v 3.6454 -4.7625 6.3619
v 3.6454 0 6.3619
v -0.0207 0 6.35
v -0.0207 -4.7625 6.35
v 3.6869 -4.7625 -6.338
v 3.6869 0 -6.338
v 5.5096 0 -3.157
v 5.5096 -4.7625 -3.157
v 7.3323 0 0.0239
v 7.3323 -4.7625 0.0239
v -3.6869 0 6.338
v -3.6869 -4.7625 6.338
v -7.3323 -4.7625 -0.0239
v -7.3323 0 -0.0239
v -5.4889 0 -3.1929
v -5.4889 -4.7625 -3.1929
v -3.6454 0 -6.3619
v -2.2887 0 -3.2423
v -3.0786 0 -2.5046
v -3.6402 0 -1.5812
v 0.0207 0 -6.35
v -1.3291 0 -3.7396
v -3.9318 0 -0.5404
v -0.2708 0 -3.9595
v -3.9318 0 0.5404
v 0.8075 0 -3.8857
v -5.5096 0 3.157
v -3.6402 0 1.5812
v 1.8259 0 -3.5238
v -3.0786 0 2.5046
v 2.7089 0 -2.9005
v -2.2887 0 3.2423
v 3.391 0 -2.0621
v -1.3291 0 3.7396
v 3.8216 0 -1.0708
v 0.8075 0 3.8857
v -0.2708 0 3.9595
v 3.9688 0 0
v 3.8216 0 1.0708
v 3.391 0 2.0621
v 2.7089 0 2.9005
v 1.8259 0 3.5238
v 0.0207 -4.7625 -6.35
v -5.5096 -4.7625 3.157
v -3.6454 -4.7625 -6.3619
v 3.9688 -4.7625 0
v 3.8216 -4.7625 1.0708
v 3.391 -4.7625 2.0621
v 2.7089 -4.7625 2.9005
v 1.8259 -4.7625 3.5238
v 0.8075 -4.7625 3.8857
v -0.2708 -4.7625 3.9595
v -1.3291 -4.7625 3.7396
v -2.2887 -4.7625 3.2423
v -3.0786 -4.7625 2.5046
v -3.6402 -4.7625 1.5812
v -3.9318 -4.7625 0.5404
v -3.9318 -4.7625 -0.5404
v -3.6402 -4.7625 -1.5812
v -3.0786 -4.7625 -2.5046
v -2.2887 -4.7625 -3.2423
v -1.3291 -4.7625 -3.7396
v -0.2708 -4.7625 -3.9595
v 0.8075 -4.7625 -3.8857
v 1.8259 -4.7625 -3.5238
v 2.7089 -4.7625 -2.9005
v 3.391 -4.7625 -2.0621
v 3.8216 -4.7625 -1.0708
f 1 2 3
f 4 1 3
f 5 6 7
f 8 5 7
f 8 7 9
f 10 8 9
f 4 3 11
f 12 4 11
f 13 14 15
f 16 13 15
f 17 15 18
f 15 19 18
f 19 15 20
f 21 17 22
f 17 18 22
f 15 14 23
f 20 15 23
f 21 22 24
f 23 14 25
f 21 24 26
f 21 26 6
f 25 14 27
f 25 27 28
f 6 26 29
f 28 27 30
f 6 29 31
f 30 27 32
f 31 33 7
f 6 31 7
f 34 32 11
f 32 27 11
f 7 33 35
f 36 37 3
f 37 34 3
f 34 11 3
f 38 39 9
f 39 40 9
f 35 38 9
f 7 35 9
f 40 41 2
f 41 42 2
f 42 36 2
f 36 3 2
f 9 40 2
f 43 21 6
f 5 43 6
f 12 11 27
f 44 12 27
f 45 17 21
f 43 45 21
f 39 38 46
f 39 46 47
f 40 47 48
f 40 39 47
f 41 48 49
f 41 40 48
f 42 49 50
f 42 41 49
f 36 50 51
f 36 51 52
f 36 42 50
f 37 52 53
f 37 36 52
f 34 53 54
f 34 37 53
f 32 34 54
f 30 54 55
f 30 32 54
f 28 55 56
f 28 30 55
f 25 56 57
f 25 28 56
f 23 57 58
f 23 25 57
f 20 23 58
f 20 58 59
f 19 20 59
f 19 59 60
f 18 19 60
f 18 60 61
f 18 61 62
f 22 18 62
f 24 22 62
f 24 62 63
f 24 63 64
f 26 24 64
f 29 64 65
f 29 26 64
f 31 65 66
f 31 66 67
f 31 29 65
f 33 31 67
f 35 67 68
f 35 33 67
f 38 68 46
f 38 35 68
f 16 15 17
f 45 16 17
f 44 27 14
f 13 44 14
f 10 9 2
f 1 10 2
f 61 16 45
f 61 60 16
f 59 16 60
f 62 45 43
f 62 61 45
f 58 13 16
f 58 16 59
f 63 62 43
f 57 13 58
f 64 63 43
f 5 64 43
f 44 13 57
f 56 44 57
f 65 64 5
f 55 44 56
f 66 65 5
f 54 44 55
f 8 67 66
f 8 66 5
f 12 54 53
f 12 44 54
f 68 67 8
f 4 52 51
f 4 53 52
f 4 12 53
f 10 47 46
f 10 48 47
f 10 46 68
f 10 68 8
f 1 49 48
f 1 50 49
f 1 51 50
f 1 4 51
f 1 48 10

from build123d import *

# Parameters (mm, degrees)
F0_R     = 3.96875
F1_DEPTH = 4.7625


with BuildPart() as f1:
    # F0 (on Front) → F1 (new body)
    with BuildSketch(Plane.XZ):
        with BuildLine():
            ThreePointArc((5.5096007047, -3.1570239268), (6.1363044447, -1.6334833218), (6.35, 0))
            ThreePointArc((6.35, 0), (6.1309371935, 1.6535141757), (5.4888632664, 3.1929422235))
            ThreePointArc((5.4888632664, 3.1929422235), (3.1570238869, 5.5096007276), (-0.0207375096, 6.3499661382))
            ThreePointArc((-0.0207375096, 6.3499661382), (-3.1929422935, 5.4888632257), (-5.5096007601, 3.1570238302))
            ThreePointArc((-5.5096007601, 3.1570238302), (-6.3499661379, -0.0207375771), (-5.4888631828, -3.1929423673))
            ThreePointArc((-5.4888631828, -3.1929423673), (-3.1570238246, -5.5096007633), (0.020737487, -6.3499661382))
            ThreePointArc((0.020737487, -6.3499661382), (3.1929422356, -5.4888632594), (5.5096007047, -3.1570239268))
        make_face()
        Circle(F0_R, mode=Mode.SUBTRACT)
        with BuildLine():
            ThreePointArc((-5.5096007601, 3.1570238302), (-3.1929422935, 5.4888632257), (-0.0207375096, 6.3499661382))
            Line((-0.0207375096, 6.3499661382), (-3.6868921494, 6.3379933427))
            Line((-3.6868921494, 6.3379933427), (-5.5096007601, 3.1570238302))
        make_face()
        with BuildLine():
            ThreePointArc((-5.4888631828, -3.1929423673), (-6.3499661379, -0.0207375771), (-5.5096007601, 3.1570238302))
            Line((-5.5096007601, 3.1570238302), (-7.3323093185, -0.023945591))
            Line((-7.3323093185, -0.023945591), (-5.4888631828, -3.1929423673))
        make_face()
        with BuildLine():
            Line((-3.6454171691, -6.3619389337), (0.020737487, -6.3499661382))
            ThreePointArc((0.020737487, -6.3499661382), (-3.1570238246, -5.5096007633), (-5.4888631828, -3.1929423673))
            Line((-5.4888631828, -3.1929423673), (-3.6454171691, -6.3619389337))
        make_face()
        with BuildLine():
            Line((3.6868921494, -6.3379933427), (5.5096007047, -3.1570239268))
            ThreePointArc((5.5096007047, -3.1570239268), (3.1929422356, -5.4888632594), (0.020737487, -6.3499661382))
            Line((0.020737487, -6.3499661382), (3.6868921494, -6.3379933427))
        make_face()
        with BuildLine():
            ThreePointArc((5.4888632664, 3.1929422235), (6.1309371935, 1.6535141757), (6.35, 0))
            ThreePointArc((6.35, 0), (6.1363044447, -1.6334833218), (5.5096007047, -3.1570239268))
            Line((5.5096007047, -3.1570239268), (7.3323093185, 0.023945591))
            Line((7.3323093185, 0.023945591), (5.4888632664, 3.1929422235))
        make_face()
        with BuildLine():
            ThreePointArc((-0.0207375096, 6.3499661382), (3.1570238869, 5.5096007276), (5.4888632664, 3.1929422235))
            Line((5.4888632664, 3.1929422235), (3.6454171691, 6.3619389337))
            Line((3.6454171691, 6.3619389337), (-0.0207375096, 6.3499661382))
        make_face()
    extrude(amount=F1_DEPTH)


solid = f1.part
